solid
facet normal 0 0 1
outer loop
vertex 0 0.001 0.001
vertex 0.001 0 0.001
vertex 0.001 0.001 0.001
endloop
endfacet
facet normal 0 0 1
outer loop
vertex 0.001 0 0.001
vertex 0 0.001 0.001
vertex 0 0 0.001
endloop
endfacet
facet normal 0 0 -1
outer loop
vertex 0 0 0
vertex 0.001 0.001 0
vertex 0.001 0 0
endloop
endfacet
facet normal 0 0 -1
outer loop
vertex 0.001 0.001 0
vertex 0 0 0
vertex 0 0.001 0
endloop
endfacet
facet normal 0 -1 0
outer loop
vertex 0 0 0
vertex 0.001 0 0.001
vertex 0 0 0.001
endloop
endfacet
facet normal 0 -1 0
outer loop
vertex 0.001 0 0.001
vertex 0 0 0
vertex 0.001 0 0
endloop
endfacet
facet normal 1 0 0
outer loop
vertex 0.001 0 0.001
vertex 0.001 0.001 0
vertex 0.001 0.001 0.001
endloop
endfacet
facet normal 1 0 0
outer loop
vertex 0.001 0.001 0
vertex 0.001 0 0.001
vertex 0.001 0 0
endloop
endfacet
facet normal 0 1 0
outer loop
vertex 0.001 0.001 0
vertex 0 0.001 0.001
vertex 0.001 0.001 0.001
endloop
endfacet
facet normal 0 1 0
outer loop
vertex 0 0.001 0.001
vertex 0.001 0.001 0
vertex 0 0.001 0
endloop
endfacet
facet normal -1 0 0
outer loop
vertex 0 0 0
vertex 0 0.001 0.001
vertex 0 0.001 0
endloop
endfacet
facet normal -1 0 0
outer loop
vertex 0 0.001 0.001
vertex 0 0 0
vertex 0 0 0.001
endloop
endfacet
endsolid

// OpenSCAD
// file: ../src/ut_math.scad
// ut_math — the handful of functions that replace 1035 lines of vendored
// maths.scad and vector.scad. See docs/developer/history.md §5.

use <ut_core.scad>;

function ut_unit(v) = v / norm(v);

// The angle between two 3D vectors, in degrees, ALWAYS via atan2.
// 3D only: cross() requires 3-vectors. For planar angles use atan2(y, x).
// NEVER acos: acos(1.0000001) is nan on OpenSCAD 2021.01 and near-collinear
// waypoints are the most common input there is. See AGENTS.md rule 7.
function ut_turn(a, b) = atan2(norm(cross(a, b)), a * b);

// Rodrigues' rotation of v about unit axis k by ang degrees.
// This is reference/axford/half_curvedPipe.scad:19, generalised. docs/developer/history.md §2.
function ut_rotv(v, ang, k) = v * cos(ang) + cross(k, v) * sin(ang) + k * (k * v) * (1 - cos(ang));

// Project ref orthogonal to t and normalise -- the roll-reference seed.
// Falls back from UP to BACK when the run starts parallel to ref, which is the
// vertical-tangent NaN that has killed every previous attempt at this.
function ut_ref_fallback(t, ref = undef) =
    let (
        r0 = is_undef(ref) ? ut_up() : ref,
        tu = ut_unit(t),
        r = norm(cross(tu, r0)) < 1e-6 ? (norm(cross(tu, ut_back())) < 1e-6 ? [1, 0, 0] : ut_back())
        : r0
    ) ut_unit(r - tu * (r * tu));

// Re-orthogonalise n against t, preserving n's direction as closely as possible.
function ut_ortho(t, n) = let (tu = ut_unit(t), p = n - tu * (n * tu)) ut_unit(p);

// OpenSCAD's own $fn/$fa/$fs rule, applied per-radius and scaled to a partial
// sweep. This is why an arc-native IR gives better meshes than a sampled one:
// each bend gets facets from ITS OWN radius.
function ut_fragments(r, ang = 360) =
    let (full = $fn > 0 ? max($fn, 3) : ceil(max(min(360 / $fa, r * 2 * PI / $fs), 5)))
    max(2, ceil(full * abs(ang) / 360));

// The inradius of the polyhedron OpenSCAD actually emits for sphere(r) -- the
// distance to its nearest FACE, not to its vertices, which sit on r.
//
// A sphere is faceted in two directions at once, so it loses cos(180/n) twice.
// Verified against the emitted mesh: EXACT for n >= 8 (8.5355, 9.3301, 9.8296,
// 9.9039, 9.9572 at n = 8, 12, 24, 32, 48 for r=10) and conservative below it
// (6.545 modelled vs 7.330 actual at n=5). Erring low is the safe direction for
// anything that has to fit inside the result.
function ut_sphere_inradius(r) = let (n = ut_fragments(r, 360)) r * pow(cos(180 / n), 2);

// A closed CCW polygon of n points on a circle of radius r, sampled by ANGLE.
// Angle-sampling is what makes two loops correspondence-aligned (PROF-2 /
// ADR 0006); sampling by arclength does not, and self-intersects the end caps.
function ut_ring(r, n, a0 = 0) = [for (i = [0:n - 1]) let (a = a0 + 360 * i / n) [r * cos(a), r * sin(a)]];

// The largest circle centred on the origin that fits inside a closed 2D loop.
//
// This is the distance to the EDGES, not to the vertices. For a polygon they are
// different by cos(180/n), and using the vertices overstates the answer at every
// resolution -- ut_ring() puts its points exactly on the nominal circle, so a
// vertex-based "inradius" returns the nominal radius forever while the real
// inscribed circle is smaller. That overstatement let a joint's subtracted core
// sphere punch through a run's outer wall at coarse $fn, silently.
//
// Distance is taken to the edge's infinite LINE. For a non-convex loop the
// perpendicular foot can fall outside the segment, so this UNDER-estimates --
// which is the safe direction for anything that gets subtracted.
function ut_inradius(loop) = min([for (i = [0:len(loop) - 1]) _ut_edge_dist(loop, i)]);
function _ut_edge_dist(p, i) =
    let (a = p[i], b = p[ (i + 1) % len(p)], d = b - a, L = norm(d)) L < ut_eps() ? norm(a)
    : abs(a[0] * d[1] - a[1] * d[0]) / L;

// Signed area of a 2D polygon. Positive = counter-clockwise.
function ut_area2d(poly) = let (n = len(poly)) 0.5 * _ut_area_sum(poly, n, 0);
function _ut_area_sum(p, n, i) =
    i >= n ? 0
    : (p[i][0] * p[ (i + 1) % n][1] - p[ (i + 1) % n][0] * p[i][1]) + _ut_area_sum(p, n, i + 1);

// Volume of a closed triangulated mesh by the divergence theorem.
// Replaces BOSL2's vnf_volume(). Verified exact to 6 s.f. against analytic
// values in Phase 0 -- see ADR 0001.
function ut_volume(pts, faces) = _ut_vol(pts, faces, 0);
function _ut_vol(P, F, i) = i >= len(F) ? 0 : _ut_face_vol(P, F[i]) + _ut_vol(P, F, i + 1);
function _ut_face_vol(P, f) = _ut_fan(P, f, 1);
function _ut_fan(P, f, k) = k > len(f) - 2 ? 0 : (P[f[0]] * cross(P[f[k]], P[f[k + 1]])) / 6 + _ut_fan(P, f, k + 1);
// file: ../src/ut_core.scad
// ut_core — shared constants, record access, and assertion helpers.
//
// NOTE, verified on 2021.01: `use <>` does not export top-level VARIABLES at
// all, and it does not re-export transitively either -- see src/uniTube.scad for
// why the entry point is the one file that `include`s. Every shared constant in
// this library is therefore a zero-argument FUNCTION, not a variable.

function ut_eps() = 1e-9;
function ut_min_wall() = 1.2; // ~3 perimeters on a 0.4 nozzle; a warning, not an error

function ut_up() = [0, 0, 1];
function ut_back() = [0, 1, 0];

// --- association lists: opts = [["key", value], ...] --------------------------
function ut_opt(opts, key, dflt = undef) =
    let (hit = [for (e = opts) if (e[0] == key) e[1]]) len(hit) > 0 ? hit[0]
    : dflt;

// --- tagged records -----------------------------------------------------------
// Every record is ["tag", ...fields]. User code reads them through accessors,
// never by index, so a field can be added without invalidating existing values.
// The accessors live beside their constructors; there is no generic reader here,
// because nothing ever needed to ask a record what it was.

// --- assertion helper ---------------------------------------------------------
// Usage: function f(x) = ut_req(x > 0, str("f(): x must be positive, got ", x)) x * 2;
// Returns true when the condition holds so it can prefix an expression.
function ut_req(cond, msg) = assert(cond, msg) true;
// main file
// t_math — the primitives everything else rests on.

use <../src/ut_core.scad>;
use <../src/ut_math.scad>;

// --- ut_turn: the acos replacement (AGENTS.md rule 7, docs/developer/history.md §3) -----
assert(abs(ut_turn([1, 0, 0], [0, 1, 0]) - 90) < 1e-9, "ut_turn: orthogonal -> 90");
assert(abs(ut_turn([1, 0, 0], [1, 0, 0])) < 1e-9, "ut_turn: identical -> 0");
assert(abs(ut_turn([1, 0, 0], [-1, 0, 0]) - 180) < 1e-9, "ut_turn: opposed -> 180");
assert(abs(ut_turn([2, 0, 0], [0, 5, 0]) - 90) < 1e-9, "ut_turn: magnitude-independent");
assert(is_num(ut_turn([1, 0, 0], [1, 1e-9, 0])), "ut_turn: must not NaN on near-collinear input");
assert(!is_num(acos(1.0000001)), "acos past 1.0 is nan on 2021.01 -- the bug ut_turn exists to avoid");

// --- ut_rotv: Rodrigues -------------------------------------------------------
assert(norm(ut_rotv([1, 0, 0], 90, [0, 0, 1]) - [0, 1, 0]) < 1e-9, "ut_rotv: x about z by 90 -> y");
assert(
    norm(ut_rotv([0, 0, 1], 90, [0, 0, 1]) - [0, 0, 1]) < 1e-9,
    "ut_rotv: a vector PARALLEL to the axis is invariant -- this is why a planar bend has zero twist"
);
assert(
    abs(norm(ut_rotv([1, 2, 3], 37, ut_unit([1, 1, 0]))) - norm([1, 2, 3])) < 1e-9,
    "ut_rotv: rotation preserves length"
);

// --- ut_ref_fallback: the vertical-tangent NaN --------------------------------
assert(norm(ut_ref_fallback([1, 0, 0]) - [0, 0, 1]) < 1e-9, "ut_ref_fallback: horizontal run seeds UP");
n_vert = ut_ref_fallback([0, 0, 1]);
assert(
    is_num(n_vert[0]) && is_num(n_vert[1]) && is_num(n_vert[2]),
    "ut_ref_fallback: a VERTICAL run must not produce NaN -- UP is parallel to the tangent there"
);
assert(abs(norm(n_vert) - 1) < 1e-9, "ut_ref_fallback: result is a unit vector");
assert(abs(n_vert * [0, 0, 1]) < 1e-9, "ut_ref_fallback: result is orthogonal to the tangent");

// --- ut_ring: angle sampling, the basis of PROF-2 (ADR 0006) -----------------
r8 = ut_ring(5, 8);
assert(len(r8) == 8, "ut_ring: point count");
assert(abs(norm(r8[0]) - 5) < 1e-9, "ut_ring: radius");
assert(ut_area2d(r8) > 0, "ut_ring: counter-clockwise (positive signed area)");
assert(ut_area2d([for (i = [len(r8) - 1:-1:0]) r8[i]]) < 0, "ut_area2d: reversed loop is negative");
// Correspondence: two rings of different radius agree in ANGLE at every index.
// (ut_turn is 3D-only -- cross() needs 3-vectors -- so compare planar angles.)
a = ut_ring(10, 8);
b = ut_ring(4, 8);
assert(
    max([for (i = [0:7]) abs(atan2(a[i][1], a[i][0]) - atan2(b[i][1], b[i][0]))]) < 1e-9,
    "PROF-2: rings of different radii must be angle-aligned index-for-index"
);

// --- ut_fragments -------------------------------------------------------------
assert(ut_fragments(15, 90, $fn=0, $fa=12, $fs=2) == 8, "ut_fragments: r=15 over 90deg at default $fa/$fs");
assert(ut_fragments(15, 360, $fn=64) == 64, "ut_fragments: explicit $fn, full circle");
assert(ut_fragments(15, 90, $fn=64) == 16, "ut_fragments: explicit $fn scales with sweep");
assert(ut_fragments(1000, 1) >= 2, "ut_fragments: never fewer than 2 per segment");

// --- ut_volume ----------------------------------------------------------------
// Unit cube as 12 triangles, outward-facing.
cp = [[0, 0, 0], [1, 0, 0], [1, 1, 0], [0, 1, 0], [0, 0, 1], [1, 0, 1], [1, 1, 1], [0, 1, 1]];
cf = [
    [0, 3, 2],
    [0, 2, 1],
    [4, 5, 6],
    [4, 6, 7],
    [0, 1, 5],
    [0, 5, 4],
    [1, 2, 6],
    [1, 6, 5],
    [2, 3, 7],
    [2, 7, 6],
    [3, 0, 4],
    [3, 4, 7],
];
assert(abs(ut_volume(cp, cf) - 1) < 1e-9, "ut_volume: unit cube must measure exactly 1");

// ============================================ inradius: EDGES, not vertices
// ut_ring puts every point exactly on the nominal circle, so a vertex-based
// "inradius" returns the nominal radius at every resolution while the real
// inscribed circle is smaller by cos(180/n). That overstatement sized a
// subtracted sphere and put a hole through a junction.
for (n = [5, 6, 8, 12, 24, 64])
{
    let (ring = ut_ring(10, n), want = 10 * cos(180 / n))
    {
        assert(
            abs(max([for (q = ring) norm(q)]) - 10) < 1e-9,
            "the vertices are on the nominal circle -- that is the trap"
        );
        assert(
            abs(ut_inradius(ring) - want) < 1e-9,
            str("ut_inradius at n=", n, ": expected ", want, " got ", ut_inradius(ring))
        );
        assert(ut_inradius(ring) <= 10 + 1e-9, "the inradius never exceeds the circumradius");
    }
}
// A square, where the answer is known by inspection: circumradius 10*sqrt(2),
// inradius exactly 10.
sq = [[10, 10], [-10, 10], [-10, -10], [10, -10]];
assert(abs(ut_inradius(sq) - 10) < 1e-9, str("square inradius must be 10, got ", ut_inradius(sq)));

// ============================================ the sphere OpenSCAD actually emits
// A sphere is faceted in two directions, so it loses cos(180/n) twice. Measured
// against the emitted mesh: exact for n >= 8, conservative below.
for (t = [[8, 8.5355], [12, 9.3301], [24, 9.8296], [32, 9.9039], [48, 9.9572]])
{
    let (got = ut_sphere_inradius(10, $fn=t[0]))
    assert(abs(got - t[1]) < 1e-3, str("sphere inradius at $fn=", t[0], ": expected ", t[1], " got ", got));
}
// Below n=8 it must UNDER-estimate -- erring low is the safe direction for
// anything that has to fit inside the result.
assert(ut_sphere_inradius(10, $fn=5) < 7.33, "at $fn=5 the model must sit below the true 7.330");
assert(ut_sphere_inradius(10, $fn=6) < 7.746, "at $fn=6 the model must sit below the true 7.746");

cube(0.001); // sentinel
